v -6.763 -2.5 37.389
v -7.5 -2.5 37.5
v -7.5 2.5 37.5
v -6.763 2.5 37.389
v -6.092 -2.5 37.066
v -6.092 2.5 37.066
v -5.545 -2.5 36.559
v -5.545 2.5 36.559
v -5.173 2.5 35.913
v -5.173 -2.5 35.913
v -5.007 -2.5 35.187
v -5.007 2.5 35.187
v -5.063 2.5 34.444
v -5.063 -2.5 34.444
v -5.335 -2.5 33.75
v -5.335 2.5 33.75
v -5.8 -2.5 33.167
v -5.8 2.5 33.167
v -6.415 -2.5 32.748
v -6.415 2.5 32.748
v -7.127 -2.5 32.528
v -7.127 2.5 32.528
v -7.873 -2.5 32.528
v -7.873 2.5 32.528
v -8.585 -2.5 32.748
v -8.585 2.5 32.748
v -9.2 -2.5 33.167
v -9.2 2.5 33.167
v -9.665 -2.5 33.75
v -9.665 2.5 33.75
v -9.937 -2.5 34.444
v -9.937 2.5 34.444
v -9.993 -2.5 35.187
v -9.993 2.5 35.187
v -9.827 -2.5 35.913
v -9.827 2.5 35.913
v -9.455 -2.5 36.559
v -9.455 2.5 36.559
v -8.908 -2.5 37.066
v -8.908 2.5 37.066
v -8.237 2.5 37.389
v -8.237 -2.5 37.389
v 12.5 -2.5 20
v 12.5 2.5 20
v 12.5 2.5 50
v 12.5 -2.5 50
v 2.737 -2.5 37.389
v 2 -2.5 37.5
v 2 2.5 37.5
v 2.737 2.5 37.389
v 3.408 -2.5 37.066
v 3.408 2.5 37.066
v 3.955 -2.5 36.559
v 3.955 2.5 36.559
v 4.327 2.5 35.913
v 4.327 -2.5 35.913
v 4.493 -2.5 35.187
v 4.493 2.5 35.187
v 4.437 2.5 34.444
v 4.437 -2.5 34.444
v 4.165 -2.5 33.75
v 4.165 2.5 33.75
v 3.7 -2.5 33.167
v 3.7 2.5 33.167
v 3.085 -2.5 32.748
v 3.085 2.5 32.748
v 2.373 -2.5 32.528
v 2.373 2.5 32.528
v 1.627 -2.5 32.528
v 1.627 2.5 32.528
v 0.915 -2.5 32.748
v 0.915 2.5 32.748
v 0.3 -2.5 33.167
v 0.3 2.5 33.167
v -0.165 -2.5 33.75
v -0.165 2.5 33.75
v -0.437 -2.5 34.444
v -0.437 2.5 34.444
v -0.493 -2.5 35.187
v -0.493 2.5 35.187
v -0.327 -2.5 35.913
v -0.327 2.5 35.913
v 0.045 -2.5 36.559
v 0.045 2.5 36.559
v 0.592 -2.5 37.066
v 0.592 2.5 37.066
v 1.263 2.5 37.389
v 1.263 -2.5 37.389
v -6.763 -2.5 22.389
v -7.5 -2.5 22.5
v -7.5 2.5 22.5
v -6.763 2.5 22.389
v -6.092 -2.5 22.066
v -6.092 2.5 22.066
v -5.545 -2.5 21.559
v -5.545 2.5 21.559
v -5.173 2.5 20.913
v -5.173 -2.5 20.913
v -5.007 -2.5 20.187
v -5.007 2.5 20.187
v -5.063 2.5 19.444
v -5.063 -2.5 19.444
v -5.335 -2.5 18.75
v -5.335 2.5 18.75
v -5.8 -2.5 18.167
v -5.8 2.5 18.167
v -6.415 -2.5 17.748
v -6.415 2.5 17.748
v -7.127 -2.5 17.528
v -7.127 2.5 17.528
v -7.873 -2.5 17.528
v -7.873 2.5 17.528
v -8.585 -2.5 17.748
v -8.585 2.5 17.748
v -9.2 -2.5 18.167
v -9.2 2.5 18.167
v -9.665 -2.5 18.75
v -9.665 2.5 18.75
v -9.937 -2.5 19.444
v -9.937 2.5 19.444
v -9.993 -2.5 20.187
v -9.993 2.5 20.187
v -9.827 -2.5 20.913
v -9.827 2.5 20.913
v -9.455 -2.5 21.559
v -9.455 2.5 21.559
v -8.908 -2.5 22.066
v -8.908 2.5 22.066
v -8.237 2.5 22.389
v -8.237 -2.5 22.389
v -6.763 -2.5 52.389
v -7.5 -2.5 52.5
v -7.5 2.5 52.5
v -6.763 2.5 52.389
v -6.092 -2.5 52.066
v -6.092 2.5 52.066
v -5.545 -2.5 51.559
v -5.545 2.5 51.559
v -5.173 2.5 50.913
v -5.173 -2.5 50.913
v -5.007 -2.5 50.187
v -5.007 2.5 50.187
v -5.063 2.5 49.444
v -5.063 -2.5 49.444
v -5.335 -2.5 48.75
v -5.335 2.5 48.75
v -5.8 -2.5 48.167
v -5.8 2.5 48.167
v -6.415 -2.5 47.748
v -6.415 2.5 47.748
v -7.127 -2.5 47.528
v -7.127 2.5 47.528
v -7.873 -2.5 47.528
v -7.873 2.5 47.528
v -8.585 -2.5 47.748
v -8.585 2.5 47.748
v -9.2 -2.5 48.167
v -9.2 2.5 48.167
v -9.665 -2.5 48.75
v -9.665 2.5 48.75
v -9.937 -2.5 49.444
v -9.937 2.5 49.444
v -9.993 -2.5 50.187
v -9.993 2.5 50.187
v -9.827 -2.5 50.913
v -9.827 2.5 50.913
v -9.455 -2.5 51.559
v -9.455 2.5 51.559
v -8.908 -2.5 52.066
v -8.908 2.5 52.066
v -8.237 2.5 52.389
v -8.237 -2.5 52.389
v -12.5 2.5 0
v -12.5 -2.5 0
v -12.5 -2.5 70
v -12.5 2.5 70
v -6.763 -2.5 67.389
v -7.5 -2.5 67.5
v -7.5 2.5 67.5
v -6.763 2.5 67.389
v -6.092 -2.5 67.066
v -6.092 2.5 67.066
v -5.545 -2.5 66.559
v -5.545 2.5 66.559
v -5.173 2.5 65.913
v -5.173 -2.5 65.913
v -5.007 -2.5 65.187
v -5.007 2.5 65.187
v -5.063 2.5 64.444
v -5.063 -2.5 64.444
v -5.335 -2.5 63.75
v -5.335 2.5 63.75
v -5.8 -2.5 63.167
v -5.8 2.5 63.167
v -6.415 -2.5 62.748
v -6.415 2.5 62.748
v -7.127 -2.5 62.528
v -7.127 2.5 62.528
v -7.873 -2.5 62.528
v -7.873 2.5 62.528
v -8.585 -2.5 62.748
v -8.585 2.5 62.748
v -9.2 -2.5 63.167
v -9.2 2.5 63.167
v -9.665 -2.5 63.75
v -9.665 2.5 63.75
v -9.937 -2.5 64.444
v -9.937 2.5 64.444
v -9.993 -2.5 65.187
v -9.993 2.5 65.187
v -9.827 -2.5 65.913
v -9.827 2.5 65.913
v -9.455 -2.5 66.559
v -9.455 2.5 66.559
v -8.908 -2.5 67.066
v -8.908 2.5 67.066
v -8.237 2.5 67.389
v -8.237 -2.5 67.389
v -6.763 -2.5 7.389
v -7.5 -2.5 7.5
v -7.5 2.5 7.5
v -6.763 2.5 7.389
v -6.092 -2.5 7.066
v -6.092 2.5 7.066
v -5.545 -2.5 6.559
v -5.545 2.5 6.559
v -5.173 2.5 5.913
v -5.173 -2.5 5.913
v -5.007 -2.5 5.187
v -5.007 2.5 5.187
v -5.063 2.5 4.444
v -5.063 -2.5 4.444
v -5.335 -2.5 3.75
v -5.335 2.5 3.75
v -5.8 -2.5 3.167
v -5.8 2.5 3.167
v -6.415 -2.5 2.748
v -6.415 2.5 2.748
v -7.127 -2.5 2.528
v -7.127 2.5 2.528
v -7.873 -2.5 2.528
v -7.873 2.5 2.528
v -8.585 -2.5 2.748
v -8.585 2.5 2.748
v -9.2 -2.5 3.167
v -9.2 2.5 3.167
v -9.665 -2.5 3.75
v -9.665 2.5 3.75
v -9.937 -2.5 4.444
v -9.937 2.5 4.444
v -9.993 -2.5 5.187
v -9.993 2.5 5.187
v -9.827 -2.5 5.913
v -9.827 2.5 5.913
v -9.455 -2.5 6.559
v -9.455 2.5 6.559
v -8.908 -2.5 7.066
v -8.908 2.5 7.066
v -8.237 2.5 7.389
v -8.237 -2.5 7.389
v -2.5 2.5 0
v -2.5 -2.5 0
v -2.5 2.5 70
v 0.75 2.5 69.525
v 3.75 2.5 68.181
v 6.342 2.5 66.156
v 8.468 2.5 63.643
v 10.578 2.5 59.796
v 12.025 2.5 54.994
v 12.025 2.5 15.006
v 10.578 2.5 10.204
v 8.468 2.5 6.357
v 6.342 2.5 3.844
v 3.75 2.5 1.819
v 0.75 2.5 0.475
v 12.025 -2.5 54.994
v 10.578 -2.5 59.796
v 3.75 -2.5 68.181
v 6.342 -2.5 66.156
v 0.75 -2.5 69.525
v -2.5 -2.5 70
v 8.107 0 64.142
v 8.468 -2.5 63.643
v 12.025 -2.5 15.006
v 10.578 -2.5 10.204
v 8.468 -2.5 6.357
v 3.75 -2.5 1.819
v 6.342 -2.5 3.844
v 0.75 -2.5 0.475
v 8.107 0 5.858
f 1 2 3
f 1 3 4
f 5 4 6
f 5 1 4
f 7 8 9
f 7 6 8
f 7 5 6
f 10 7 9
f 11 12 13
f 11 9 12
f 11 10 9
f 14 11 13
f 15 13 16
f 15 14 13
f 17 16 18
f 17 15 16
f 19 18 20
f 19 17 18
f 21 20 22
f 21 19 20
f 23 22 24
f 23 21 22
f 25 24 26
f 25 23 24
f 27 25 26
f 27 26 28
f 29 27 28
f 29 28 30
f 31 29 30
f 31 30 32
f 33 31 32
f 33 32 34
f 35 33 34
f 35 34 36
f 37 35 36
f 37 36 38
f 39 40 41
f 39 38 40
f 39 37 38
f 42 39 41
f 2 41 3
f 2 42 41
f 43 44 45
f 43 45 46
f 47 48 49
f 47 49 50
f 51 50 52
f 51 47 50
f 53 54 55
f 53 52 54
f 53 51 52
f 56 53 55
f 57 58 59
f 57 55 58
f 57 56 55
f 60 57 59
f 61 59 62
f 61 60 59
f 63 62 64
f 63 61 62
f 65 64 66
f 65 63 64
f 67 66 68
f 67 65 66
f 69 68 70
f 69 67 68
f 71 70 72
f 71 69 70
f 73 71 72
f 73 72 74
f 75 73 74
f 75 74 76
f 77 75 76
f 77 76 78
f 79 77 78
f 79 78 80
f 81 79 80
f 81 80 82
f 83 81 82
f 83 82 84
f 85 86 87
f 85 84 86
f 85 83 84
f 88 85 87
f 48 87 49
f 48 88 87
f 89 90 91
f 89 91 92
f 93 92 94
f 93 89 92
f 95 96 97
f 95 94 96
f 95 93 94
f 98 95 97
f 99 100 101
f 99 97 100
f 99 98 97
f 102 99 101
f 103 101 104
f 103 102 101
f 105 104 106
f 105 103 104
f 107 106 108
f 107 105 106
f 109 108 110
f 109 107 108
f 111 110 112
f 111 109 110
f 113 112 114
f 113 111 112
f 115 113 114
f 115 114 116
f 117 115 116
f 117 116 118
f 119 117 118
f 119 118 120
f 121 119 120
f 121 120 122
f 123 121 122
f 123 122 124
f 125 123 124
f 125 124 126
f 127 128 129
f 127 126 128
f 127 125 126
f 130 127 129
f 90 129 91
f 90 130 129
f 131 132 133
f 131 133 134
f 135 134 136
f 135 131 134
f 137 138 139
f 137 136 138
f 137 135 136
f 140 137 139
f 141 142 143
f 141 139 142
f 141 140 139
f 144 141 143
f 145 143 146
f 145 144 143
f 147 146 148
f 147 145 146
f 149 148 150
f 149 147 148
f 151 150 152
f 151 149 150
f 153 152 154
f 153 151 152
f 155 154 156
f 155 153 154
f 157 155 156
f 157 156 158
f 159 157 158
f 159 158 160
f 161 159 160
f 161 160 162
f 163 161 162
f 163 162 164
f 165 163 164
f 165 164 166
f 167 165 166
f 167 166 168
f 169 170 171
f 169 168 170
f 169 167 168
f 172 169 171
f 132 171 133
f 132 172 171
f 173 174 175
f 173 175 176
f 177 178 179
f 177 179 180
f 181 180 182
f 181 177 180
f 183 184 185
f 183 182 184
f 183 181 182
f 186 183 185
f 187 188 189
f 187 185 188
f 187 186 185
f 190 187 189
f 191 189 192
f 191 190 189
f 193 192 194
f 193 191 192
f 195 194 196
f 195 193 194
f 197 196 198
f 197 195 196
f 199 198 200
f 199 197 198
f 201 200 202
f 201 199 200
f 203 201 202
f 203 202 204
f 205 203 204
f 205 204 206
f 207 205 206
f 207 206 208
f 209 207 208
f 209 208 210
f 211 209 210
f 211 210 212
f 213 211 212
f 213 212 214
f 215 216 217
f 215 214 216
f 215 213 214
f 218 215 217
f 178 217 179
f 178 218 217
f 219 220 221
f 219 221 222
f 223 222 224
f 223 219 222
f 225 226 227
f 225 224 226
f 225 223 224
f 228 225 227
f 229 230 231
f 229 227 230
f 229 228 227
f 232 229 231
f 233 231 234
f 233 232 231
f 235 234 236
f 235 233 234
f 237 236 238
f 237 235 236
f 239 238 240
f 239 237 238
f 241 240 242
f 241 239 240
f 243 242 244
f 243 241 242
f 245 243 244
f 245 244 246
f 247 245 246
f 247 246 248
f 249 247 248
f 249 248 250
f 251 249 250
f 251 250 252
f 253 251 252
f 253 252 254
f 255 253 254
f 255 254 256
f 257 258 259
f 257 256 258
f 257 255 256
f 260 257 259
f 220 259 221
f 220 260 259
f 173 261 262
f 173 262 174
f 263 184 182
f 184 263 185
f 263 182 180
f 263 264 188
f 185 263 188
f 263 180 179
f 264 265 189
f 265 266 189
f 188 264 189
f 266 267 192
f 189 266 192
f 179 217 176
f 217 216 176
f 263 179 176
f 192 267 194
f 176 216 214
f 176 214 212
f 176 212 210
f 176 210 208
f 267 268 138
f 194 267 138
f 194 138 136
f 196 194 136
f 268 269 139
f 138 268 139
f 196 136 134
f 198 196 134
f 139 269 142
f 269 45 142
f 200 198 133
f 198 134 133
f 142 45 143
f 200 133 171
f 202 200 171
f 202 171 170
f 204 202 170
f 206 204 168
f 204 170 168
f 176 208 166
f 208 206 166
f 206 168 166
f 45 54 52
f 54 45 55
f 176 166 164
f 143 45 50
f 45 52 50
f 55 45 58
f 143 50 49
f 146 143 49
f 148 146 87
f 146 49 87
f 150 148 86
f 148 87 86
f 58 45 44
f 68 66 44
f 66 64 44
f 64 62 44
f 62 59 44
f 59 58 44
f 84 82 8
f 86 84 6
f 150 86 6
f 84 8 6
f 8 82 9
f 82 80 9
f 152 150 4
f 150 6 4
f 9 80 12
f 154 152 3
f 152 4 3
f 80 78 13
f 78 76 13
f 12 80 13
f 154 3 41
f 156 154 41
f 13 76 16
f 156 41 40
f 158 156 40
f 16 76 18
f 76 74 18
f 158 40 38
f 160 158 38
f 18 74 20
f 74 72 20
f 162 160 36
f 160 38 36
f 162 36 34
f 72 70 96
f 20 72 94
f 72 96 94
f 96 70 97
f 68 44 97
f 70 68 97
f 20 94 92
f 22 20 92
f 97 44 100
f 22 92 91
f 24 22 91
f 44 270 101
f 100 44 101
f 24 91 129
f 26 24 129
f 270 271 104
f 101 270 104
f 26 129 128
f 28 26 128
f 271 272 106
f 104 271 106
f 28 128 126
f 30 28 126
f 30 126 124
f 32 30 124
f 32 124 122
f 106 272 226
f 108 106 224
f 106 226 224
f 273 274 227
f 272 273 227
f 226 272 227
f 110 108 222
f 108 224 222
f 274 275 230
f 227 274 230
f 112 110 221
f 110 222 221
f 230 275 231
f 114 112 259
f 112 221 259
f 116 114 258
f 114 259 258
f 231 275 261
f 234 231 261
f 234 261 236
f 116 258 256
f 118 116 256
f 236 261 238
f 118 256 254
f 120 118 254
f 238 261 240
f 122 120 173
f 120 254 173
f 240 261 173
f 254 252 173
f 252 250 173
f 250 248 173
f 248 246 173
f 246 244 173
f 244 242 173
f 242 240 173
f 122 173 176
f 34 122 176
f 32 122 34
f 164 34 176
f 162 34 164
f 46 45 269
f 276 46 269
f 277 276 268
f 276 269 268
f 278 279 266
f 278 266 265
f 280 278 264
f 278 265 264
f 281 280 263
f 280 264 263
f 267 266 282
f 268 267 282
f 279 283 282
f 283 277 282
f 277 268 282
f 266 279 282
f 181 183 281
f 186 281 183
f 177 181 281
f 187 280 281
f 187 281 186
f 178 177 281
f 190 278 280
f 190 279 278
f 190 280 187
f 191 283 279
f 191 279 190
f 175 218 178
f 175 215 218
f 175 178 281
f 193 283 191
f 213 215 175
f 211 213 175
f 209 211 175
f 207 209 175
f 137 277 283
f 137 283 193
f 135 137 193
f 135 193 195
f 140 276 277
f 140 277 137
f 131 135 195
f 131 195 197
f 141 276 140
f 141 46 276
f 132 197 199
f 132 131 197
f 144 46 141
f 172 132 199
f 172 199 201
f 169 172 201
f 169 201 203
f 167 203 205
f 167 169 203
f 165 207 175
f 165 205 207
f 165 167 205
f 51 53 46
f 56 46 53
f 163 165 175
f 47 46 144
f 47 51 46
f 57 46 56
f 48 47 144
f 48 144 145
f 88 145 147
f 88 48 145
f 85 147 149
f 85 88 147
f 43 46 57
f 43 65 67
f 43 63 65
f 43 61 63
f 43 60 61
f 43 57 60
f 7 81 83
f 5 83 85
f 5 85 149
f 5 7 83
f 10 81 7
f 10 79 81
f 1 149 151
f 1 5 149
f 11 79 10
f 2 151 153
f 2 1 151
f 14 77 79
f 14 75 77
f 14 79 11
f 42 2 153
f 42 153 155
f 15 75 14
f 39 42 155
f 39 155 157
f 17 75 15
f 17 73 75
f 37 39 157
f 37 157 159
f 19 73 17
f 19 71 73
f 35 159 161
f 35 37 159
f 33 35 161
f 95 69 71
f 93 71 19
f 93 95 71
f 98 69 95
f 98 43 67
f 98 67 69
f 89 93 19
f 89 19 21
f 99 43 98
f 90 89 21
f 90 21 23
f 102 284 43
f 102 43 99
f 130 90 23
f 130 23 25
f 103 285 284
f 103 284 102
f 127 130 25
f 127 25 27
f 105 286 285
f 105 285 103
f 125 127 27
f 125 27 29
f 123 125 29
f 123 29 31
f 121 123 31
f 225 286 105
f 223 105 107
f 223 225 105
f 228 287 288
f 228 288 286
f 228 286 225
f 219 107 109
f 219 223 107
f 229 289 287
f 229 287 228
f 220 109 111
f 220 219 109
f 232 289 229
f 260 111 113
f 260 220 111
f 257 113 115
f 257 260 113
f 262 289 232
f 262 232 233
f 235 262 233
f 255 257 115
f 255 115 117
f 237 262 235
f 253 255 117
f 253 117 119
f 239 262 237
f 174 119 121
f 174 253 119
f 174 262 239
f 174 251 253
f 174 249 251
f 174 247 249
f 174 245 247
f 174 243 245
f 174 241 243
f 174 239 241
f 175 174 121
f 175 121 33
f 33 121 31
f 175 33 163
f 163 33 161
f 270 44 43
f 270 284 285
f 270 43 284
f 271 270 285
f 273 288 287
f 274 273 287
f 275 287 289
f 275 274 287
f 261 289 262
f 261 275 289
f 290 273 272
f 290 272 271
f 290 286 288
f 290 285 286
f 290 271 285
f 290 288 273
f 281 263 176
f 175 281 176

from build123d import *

# Parameters (mm, degrees)
BOSS_EXTRUDE1_DEPTH     = 70
CUT_EXTRUDE2_DEPTH      = 72.282887147
CUT_EXTRUDE2_DEPTH_BACK = 72.282887147
SKETCH2_R               = 2.5
FILLET1_SIZE            = 20
FILLET1_SIZE_2          = 15


with BuildPart() as part:
    # Sketch1 → Boss-Extrude1 (new body)
    with BuildSketch(Plane.XY):
        Polygon((6.5, 2.5), (12.5, 2.5), (12.5, -2.5), (-12.5, -2.5), (-12.5, 2.5), align=None)
    extrude(amount=BOSS_EXTRUDE1_DEPTH)

    # Sketch2 → Cut-Extrude2 (cut, two sides: drawn at the far end of the back side and taken through both)
    with BuildSketch(Plane(origin=(0, 2.5, 0), x_dir=(1, 0, 0), z_dir=(0, 1, 0)).offset(-CUT_EXTRUDE2_DEPTH_BACK)):
        with Locations(Location((-7.5, -5, 0), (0, 0, 270))):
            Circle(SKETCH2_R)
        with Locations(Location((-7.5, -20, 0), (0, 0, 270))):
            Circle(SKETCH2_R)
        with Locations(Location((-7.5, -35, 0), (0, 0, 270))):
            Circle(SKETCH2_R)
        with Locations(Location((-7.5, -50, 0), (0, 0, 270))):
            Circle(SKETCH2_R)
        with Locations(Location((-7.5, -65, 0), (0, 0, 270))):
            Circle(SKETCH2_R)
        with Locations(Location((2, -35, 0), (0, 0, 270))):
            Circle(SKETCH2_R)
    extrude(amount=CUT_EXTRUDE2_DEPTH + CUT_EXTRUDE2_DEPTH_BACK, mode=Mode.SUBTRACT)

    # Fillet1
    # an asymmetric fillet: 20, 15 mm, written as the material it takes off along each edge
    with BuildSketch(Plane(origin=(12.5, 52.5, 70), x_dir=(0, 0, -1), z_dir=(0, -1, 0))) as fillet1_piece_1:
        with BuildLine():
            Bezier((FILLET1_SIZE, 0), (0, 0), (0, -FILLET1_SIZE_2), weights=[1, 0.707106781, 1])
            Line((0, -FILLET1_SIZE_2), (0, 0))
            Line((0, 0), (FILLET1_SIZE, 0))
        make_face()
    extrude(amount=105, mode=Mode.SUBTRACT)
    with BuildSketch(Plane(origin=(12.5, 52.5, 0), x_dir=(0, 0, 1), z_dir=(0, -1, 0))) as fillet1_piece_2:
        with BuildLine():
            Bezier((FILLET1_SIZE, 0), (0, 0), (0, FILLET1_SIZE_2), weights=[1, 0.707106781, 1])
            Line((0, FILLET1_SIZE_2), (0, 0))
            Line((0, 0), (FILLET1_SIZE, 0))
        make_face()
    extrude(amount=105, mode=Mode.SUBTRACT)


solid = part.part
